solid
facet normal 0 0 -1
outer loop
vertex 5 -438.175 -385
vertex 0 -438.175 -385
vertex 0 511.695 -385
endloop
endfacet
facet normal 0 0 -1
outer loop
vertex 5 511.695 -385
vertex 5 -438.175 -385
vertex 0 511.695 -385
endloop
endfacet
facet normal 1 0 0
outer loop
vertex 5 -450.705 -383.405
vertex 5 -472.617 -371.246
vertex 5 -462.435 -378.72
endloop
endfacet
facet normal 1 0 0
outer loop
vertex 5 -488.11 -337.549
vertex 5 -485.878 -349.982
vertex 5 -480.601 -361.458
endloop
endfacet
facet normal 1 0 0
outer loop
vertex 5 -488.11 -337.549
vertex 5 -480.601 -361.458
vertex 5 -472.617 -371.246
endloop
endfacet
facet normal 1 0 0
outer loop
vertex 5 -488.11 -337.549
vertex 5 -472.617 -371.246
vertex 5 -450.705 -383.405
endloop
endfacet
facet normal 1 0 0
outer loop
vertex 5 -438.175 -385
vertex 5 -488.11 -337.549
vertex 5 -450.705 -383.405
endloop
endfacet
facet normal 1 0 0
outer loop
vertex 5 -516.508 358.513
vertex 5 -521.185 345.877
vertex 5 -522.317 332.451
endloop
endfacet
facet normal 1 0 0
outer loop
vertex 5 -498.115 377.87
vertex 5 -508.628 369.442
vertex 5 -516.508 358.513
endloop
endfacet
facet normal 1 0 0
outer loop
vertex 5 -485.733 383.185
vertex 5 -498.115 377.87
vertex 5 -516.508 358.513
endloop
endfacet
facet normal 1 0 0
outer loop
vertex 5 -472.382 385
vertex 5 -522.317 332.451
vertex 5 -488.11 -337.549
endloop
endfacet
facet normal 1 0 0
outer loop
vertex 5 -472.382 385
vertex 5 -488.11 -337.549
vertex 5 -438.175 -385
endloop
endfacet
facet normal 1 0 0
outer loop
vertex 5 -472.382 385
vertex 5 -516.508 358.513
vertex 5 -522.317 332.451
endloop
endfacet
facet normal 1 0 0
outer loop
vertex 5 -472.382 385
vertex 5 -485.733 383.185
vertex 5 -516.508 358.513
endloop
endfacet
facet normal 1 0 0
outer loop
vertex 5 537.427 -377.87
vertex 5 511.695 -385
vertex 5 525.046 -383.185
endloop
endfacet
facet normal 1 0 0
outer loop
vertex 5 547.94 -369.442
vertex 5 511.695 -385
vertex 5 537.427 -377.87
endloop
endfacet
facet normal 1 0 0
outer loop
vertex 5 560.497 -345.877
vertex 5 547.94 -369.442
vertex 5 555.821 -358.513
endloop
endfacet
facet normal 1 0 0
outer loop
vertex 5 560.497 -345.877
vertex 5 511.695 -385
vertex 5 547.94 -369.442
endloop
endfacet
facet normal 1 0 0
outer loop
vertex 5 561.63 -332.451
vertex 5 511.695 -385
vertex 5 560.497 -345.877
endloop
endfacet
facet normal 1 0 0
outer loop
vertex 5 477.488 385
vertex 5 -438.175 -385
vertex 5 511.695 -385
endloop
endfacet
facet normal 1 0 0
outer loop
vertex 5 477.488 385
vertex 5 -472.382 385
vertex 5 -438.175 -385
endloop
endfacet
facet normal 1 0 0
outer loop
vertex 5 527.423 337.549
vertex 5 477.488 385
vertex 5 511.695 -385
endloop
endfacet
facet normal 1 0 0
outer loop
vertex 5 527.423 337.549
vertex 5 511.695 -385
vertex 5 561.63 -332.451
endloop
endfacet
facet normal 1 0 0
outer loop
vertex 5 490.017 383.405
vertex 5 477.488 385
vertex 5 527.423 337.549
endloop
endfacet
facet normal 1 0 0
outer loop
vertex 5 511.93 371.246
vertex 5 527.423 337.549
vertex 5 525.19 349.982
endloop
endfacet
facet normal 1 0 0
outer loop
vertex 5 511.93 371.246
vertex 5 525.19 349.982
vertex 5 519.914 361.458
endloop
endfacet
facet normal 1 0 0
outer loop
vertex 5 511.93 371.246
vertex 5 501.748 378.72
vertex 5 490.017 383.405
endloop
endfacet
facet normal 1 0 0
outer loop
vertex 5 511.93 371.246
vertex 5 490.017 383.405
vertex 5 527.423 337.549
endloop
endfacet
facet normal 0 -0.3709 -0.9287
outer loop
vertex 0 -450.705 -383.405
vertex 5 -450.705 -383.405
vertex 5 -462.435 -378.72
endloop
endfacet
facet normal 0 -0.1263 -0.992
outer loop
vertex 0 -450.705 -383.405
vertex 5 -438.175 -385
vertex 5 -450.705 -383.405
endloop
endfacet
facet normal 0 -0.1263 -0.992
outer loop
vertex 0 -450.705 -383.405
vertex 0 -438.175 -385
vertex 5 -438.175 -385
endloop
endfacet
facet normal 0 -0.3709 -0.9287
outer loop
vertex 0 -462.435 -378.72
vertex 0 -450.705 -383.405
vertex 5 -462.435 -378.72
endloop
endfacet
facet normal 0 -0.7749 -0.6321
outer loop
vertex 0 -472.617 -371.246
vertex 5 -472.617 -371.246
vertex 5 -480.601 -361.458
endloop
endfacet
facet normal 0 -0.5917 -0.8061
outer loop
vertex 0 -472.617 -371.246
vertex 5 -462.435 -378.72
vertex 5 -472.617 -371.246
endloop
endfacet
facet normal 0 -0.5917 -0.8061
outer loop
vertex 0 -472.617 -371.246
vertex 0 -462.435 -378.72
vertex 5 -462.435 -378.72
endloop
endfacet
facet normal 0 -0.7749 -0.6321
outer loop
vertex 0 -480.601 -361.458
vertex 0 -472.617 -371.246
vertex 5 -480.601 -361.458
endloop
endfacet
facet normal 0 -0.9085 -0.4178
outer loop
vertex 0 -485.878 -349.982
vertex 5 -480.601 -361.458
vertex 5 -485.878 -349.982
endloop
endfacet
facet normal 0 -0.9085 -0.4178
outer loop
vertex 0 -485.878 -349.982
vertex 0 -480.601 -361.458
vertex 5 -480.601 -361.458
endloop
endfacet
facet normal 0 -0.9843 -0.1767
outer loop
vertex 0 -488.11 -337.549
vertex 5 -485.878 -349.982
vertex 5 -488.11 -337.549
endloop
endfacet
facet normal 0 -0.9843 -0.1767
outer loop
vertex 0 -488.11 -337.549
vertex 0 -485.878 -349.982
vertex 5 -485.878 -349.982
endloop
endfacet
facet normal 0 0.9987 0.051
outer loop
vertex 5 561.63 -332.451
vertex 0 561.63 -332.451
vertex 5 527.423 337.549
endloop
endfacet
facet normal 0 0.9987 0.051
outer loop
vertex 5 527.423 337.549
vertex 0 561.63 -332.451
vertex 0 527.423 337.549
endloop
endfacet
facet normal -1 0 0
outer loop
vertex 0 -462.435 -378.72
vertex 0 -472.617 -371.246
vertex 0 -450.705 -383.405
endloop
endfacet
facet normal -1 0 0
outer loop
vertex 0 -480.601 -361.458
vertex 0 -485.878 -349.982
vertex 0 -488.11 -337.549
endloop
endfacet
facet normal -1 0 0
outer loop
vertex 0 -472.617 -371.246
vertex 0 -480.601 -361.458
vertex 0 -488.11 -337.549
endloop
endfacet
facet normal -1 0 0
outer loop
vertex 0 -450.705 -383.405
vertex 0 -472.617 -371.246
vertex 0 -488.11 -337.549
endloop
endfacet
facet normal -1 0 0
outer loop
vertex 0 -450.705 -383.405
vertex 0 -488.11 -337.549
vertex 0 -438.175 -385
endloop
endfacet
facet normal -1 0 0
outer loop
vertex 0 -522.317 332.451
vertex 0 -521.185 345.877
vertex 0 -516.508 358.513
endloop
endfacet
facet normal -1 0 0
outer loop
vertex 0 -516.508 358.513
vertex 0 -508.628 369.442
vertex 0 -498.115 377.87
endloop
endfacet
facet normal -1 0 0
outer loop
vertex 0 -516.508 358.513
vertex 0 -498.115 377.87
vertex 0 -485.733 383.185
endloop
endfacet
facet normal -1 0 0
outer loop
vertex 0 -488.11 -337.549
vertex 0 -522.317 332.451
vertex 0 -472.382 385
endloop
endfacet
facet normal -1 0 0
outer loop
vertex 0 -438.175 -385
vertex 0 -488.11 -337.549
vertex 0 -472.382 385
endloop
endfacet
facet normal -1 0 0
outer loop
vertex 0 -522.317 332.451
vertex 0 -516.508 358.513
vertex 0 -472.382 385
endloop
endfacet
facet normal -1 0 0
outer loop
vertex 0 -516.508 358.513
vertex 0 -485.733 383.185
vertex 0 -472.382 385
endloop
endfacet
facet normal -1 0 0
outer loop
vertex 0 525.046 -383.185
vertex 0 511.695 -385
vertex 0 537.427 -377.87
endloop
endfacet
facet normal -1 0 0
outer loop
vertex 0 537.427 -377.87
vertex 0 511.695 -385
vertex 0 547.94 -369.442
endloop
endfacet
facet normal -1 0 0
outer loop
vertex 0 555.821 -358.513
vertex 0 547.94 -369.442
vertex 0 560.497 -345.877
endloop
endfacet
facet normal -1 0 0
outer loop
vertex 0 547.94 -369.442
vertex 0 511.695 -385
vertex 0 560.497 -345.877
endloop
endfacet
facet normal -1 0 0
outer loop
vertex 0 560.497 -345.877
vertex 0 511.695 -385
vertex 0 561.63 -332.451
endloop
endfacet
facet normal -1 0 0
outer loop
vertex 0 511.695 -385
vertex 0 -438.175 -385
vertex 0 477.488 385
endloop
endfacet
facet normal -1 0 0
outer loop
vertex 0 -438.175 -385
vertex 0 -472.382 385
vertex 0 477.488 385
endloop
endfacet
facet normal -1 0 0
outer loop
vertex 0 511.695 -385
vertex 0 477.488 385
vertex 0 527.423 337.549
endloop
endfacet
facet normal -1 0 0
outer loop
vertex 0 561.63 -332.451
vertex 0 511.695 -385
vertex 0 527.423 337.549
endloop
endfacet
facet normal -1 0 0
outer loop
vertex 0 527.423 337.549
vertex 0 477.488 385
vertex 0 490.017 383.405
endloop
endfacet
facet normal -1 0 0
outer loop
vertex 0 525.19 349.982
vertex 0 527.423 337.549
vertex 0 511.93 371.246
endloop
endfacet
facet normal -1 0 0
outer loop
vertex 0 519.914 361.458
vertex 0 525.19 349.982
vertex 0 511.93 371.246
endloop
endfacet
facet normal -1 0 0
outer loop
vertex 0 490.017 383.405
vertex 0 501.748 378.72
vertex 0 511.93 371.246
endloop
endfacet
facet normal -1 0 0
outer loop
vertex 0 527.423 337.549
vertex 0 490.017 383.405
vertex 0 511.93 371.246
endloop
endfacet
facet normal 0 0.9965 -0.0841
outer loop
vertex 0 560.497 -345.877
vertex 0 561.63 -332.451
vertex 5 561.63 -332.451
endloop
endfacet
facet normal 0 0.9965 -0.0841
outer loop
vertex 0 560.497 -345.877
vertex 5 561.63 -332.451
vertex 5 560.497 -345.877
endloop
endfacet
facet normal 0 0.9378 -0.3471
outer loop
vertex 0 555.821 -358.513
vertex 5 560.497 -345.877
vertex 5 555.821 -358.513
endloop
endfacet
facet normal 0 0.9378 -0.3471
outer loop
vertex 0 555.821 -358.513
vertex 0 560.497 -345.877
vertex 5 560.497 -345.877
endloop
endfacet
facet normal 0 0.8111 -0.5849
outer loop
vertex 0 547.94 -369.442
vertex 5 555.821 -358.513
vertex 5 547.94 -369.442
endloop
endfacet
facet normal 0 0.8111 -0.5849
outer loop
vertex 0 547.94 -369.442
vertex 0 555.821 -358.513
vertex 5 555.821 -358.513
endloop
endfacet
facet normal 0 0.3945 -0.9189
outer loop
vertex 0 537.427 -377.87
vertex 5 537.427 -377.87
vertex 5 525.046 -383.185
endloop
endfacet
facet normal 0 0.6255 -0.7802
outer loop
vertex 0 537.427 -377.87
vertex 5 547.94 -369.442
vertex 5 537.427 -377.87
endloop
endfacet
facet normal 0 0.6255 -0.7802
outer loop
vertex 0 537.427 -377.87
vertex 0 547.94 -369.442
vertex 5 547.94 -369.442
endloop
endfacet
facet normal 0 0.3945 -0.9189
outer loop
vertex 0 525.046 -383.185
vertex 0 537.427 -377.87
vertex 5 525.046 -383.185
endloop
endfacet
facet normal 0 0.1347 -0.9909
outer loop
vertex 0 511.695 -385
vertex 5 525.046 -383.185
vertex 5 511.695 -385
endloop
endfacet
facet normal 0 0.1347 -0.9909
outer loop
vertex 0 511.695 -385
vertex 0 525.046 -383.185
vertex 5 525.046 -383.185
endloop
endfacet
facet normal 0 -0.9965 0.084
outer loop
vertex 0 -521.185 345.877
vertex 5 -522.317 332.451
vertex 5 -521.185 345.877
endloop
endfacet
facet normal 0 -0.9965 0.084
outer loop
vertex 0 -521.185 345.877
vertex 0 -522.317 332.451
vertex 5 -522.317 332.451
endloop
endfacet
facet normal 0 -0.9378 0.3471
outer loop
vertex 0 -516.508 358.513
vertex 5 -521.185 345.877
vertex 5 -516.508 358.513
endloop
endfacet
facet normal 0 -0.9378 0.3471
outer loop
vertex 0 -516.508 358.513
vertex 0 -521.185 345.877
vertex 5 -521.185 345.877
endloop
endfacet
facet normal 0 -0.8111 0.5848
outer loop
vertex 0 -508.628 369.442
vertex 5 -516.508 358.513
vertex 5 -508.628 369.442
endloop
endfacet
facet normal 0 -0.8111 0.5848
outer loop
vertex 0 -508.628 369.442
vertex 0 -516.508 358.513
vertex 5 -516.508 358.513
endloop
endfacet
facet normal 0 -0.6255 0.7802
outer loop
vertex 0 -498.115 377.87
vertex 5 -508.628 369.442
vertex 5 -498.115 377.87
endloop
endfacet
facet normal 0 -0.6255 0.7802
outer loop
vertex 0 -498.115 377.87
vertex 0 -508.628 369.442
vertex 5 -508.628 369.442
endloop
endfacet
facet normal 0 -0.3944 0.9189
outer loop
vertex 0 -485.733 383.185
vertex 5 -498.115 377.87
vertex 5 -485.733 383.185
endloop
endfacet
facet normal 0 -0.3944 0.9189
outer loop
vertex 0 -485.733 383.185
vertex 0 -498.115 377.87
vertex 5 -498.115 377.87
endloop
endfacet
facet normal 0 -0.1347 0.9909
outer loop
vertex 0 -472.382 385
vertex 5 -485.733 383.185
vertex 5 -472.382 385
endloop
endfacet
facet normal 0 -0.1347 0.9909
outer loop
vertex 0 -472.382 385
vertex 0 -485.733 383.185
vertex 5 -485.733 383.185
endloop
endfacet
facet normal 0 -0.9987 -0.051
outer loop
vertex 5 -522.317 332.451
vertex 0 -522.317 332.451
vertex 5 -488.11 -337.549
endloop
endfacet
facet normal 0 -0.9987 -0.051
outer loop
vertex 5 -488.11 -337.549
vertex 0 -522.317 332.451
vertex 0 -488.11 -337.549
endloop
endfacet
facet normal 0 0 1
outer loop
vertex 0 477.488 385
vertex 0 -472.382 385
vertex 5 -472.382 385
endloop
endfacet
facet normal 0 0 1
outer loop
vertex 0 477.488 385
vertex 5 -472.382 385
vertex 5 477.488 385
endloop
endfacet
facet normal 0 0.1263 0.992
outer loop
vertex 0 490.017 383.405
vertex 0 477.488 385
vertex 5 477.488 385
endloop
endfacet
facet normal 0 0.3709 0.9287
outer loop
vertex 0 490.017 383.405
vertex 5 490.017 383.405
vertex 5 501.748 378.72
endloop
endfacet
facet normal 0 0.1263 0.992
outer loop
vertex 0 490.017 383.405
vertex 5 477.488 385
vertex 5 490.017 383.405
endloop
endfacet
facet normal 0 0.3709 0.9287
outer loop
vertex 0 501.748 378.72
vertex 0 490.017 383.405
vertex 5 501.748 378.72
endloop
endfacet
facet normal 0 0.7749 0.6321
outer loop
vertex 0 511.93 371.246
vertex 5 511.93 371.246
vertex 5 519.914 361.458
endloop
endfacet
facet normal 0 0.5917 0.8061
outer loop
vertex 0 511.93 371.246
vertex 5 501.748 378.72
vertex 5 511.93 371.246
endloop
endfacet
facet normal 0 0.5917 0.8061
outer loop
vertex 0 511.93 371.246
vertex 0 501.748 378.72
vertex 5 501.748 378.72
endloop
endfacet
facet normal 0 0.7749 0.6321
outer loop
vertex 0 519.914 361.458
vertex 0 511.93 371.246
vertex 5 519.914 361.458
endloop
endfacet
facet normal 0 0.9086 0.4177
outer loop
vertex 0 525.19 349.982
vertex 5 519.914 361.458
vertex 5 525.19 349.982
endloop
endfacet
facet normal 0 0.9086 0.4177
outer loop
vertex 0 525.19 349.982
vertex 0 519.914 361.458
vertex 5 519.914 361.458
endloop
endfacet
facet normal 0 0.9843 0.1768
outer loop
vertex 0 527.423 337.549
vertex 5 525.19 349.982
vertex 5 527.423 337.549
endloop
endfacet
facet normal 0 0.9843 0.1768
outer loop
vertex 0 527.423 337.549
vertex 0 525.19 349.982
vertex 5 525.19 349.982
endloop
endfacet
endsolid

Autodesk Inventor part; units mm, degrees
ref_plane "YZ Plane" through (0, 0, 0) normal (1, 0, 0) x (0, 1, 0)
ref_plane "XZ Plane" through (0, 0, 0) normal (0, 1, 0) x (-1, 0, 0)
ref_plane "XY Plane" through (0, 0, 0) normal (0, 0, 1) x (1, 0, 0)
sketch "Boceto1" plane through (0, 0, 0) normal (1, 0, 0) x (0, 1, 0)
  line L0 (-522.3171, 332.4506) -> (-488.1102, -337.5494)
  line L1 (561.6295, -332.4506) -> (527.4226, 337.5494)
  line L2 (-472.3821, 385) -> (477.4876, 385)
  line L3 (-438.1752, -385) -> (511.6946, -385)
  arc A0 (-472.3821, 385) -> (-522.3171, 332.4506) centre (-472.3821, 335) ccw
  arc A1 (-488.1102, -337.5494) -> (-438.1752, -385) centre (-438.1752, -335) ccw
  arc A2 (511.6946, -385) -> (561.6295, -332.4506) centre (511.6946, -335) ccw
  arc A3 (527.4226, 337.5494) -> (477.4876, 385) centre (477.4876, 335) ccw
  point P0 (0, 0)
  point P1 (-525, 385)
  point P2 (525, 385)
  point P3 (-485.6876, -385)
  point P4 (564.3124, -385)
  dimension "d17" = 1050
  dimension "d19" = 1050
  dimension "d20" = 770
  dimension "d21" = 385
  dimension "d22" = 525
  dimension "d23" = 50
  dimension "d24" = 50
extrude "Extrusión1" add sketch "Boceto1" along normal blind 5
equation "\"d19\" = d17"
equation "\"d21\" = 0.5 * d20"
equation "\"d22\" = 0.5 * d19"
properties part number "Ventanas"
